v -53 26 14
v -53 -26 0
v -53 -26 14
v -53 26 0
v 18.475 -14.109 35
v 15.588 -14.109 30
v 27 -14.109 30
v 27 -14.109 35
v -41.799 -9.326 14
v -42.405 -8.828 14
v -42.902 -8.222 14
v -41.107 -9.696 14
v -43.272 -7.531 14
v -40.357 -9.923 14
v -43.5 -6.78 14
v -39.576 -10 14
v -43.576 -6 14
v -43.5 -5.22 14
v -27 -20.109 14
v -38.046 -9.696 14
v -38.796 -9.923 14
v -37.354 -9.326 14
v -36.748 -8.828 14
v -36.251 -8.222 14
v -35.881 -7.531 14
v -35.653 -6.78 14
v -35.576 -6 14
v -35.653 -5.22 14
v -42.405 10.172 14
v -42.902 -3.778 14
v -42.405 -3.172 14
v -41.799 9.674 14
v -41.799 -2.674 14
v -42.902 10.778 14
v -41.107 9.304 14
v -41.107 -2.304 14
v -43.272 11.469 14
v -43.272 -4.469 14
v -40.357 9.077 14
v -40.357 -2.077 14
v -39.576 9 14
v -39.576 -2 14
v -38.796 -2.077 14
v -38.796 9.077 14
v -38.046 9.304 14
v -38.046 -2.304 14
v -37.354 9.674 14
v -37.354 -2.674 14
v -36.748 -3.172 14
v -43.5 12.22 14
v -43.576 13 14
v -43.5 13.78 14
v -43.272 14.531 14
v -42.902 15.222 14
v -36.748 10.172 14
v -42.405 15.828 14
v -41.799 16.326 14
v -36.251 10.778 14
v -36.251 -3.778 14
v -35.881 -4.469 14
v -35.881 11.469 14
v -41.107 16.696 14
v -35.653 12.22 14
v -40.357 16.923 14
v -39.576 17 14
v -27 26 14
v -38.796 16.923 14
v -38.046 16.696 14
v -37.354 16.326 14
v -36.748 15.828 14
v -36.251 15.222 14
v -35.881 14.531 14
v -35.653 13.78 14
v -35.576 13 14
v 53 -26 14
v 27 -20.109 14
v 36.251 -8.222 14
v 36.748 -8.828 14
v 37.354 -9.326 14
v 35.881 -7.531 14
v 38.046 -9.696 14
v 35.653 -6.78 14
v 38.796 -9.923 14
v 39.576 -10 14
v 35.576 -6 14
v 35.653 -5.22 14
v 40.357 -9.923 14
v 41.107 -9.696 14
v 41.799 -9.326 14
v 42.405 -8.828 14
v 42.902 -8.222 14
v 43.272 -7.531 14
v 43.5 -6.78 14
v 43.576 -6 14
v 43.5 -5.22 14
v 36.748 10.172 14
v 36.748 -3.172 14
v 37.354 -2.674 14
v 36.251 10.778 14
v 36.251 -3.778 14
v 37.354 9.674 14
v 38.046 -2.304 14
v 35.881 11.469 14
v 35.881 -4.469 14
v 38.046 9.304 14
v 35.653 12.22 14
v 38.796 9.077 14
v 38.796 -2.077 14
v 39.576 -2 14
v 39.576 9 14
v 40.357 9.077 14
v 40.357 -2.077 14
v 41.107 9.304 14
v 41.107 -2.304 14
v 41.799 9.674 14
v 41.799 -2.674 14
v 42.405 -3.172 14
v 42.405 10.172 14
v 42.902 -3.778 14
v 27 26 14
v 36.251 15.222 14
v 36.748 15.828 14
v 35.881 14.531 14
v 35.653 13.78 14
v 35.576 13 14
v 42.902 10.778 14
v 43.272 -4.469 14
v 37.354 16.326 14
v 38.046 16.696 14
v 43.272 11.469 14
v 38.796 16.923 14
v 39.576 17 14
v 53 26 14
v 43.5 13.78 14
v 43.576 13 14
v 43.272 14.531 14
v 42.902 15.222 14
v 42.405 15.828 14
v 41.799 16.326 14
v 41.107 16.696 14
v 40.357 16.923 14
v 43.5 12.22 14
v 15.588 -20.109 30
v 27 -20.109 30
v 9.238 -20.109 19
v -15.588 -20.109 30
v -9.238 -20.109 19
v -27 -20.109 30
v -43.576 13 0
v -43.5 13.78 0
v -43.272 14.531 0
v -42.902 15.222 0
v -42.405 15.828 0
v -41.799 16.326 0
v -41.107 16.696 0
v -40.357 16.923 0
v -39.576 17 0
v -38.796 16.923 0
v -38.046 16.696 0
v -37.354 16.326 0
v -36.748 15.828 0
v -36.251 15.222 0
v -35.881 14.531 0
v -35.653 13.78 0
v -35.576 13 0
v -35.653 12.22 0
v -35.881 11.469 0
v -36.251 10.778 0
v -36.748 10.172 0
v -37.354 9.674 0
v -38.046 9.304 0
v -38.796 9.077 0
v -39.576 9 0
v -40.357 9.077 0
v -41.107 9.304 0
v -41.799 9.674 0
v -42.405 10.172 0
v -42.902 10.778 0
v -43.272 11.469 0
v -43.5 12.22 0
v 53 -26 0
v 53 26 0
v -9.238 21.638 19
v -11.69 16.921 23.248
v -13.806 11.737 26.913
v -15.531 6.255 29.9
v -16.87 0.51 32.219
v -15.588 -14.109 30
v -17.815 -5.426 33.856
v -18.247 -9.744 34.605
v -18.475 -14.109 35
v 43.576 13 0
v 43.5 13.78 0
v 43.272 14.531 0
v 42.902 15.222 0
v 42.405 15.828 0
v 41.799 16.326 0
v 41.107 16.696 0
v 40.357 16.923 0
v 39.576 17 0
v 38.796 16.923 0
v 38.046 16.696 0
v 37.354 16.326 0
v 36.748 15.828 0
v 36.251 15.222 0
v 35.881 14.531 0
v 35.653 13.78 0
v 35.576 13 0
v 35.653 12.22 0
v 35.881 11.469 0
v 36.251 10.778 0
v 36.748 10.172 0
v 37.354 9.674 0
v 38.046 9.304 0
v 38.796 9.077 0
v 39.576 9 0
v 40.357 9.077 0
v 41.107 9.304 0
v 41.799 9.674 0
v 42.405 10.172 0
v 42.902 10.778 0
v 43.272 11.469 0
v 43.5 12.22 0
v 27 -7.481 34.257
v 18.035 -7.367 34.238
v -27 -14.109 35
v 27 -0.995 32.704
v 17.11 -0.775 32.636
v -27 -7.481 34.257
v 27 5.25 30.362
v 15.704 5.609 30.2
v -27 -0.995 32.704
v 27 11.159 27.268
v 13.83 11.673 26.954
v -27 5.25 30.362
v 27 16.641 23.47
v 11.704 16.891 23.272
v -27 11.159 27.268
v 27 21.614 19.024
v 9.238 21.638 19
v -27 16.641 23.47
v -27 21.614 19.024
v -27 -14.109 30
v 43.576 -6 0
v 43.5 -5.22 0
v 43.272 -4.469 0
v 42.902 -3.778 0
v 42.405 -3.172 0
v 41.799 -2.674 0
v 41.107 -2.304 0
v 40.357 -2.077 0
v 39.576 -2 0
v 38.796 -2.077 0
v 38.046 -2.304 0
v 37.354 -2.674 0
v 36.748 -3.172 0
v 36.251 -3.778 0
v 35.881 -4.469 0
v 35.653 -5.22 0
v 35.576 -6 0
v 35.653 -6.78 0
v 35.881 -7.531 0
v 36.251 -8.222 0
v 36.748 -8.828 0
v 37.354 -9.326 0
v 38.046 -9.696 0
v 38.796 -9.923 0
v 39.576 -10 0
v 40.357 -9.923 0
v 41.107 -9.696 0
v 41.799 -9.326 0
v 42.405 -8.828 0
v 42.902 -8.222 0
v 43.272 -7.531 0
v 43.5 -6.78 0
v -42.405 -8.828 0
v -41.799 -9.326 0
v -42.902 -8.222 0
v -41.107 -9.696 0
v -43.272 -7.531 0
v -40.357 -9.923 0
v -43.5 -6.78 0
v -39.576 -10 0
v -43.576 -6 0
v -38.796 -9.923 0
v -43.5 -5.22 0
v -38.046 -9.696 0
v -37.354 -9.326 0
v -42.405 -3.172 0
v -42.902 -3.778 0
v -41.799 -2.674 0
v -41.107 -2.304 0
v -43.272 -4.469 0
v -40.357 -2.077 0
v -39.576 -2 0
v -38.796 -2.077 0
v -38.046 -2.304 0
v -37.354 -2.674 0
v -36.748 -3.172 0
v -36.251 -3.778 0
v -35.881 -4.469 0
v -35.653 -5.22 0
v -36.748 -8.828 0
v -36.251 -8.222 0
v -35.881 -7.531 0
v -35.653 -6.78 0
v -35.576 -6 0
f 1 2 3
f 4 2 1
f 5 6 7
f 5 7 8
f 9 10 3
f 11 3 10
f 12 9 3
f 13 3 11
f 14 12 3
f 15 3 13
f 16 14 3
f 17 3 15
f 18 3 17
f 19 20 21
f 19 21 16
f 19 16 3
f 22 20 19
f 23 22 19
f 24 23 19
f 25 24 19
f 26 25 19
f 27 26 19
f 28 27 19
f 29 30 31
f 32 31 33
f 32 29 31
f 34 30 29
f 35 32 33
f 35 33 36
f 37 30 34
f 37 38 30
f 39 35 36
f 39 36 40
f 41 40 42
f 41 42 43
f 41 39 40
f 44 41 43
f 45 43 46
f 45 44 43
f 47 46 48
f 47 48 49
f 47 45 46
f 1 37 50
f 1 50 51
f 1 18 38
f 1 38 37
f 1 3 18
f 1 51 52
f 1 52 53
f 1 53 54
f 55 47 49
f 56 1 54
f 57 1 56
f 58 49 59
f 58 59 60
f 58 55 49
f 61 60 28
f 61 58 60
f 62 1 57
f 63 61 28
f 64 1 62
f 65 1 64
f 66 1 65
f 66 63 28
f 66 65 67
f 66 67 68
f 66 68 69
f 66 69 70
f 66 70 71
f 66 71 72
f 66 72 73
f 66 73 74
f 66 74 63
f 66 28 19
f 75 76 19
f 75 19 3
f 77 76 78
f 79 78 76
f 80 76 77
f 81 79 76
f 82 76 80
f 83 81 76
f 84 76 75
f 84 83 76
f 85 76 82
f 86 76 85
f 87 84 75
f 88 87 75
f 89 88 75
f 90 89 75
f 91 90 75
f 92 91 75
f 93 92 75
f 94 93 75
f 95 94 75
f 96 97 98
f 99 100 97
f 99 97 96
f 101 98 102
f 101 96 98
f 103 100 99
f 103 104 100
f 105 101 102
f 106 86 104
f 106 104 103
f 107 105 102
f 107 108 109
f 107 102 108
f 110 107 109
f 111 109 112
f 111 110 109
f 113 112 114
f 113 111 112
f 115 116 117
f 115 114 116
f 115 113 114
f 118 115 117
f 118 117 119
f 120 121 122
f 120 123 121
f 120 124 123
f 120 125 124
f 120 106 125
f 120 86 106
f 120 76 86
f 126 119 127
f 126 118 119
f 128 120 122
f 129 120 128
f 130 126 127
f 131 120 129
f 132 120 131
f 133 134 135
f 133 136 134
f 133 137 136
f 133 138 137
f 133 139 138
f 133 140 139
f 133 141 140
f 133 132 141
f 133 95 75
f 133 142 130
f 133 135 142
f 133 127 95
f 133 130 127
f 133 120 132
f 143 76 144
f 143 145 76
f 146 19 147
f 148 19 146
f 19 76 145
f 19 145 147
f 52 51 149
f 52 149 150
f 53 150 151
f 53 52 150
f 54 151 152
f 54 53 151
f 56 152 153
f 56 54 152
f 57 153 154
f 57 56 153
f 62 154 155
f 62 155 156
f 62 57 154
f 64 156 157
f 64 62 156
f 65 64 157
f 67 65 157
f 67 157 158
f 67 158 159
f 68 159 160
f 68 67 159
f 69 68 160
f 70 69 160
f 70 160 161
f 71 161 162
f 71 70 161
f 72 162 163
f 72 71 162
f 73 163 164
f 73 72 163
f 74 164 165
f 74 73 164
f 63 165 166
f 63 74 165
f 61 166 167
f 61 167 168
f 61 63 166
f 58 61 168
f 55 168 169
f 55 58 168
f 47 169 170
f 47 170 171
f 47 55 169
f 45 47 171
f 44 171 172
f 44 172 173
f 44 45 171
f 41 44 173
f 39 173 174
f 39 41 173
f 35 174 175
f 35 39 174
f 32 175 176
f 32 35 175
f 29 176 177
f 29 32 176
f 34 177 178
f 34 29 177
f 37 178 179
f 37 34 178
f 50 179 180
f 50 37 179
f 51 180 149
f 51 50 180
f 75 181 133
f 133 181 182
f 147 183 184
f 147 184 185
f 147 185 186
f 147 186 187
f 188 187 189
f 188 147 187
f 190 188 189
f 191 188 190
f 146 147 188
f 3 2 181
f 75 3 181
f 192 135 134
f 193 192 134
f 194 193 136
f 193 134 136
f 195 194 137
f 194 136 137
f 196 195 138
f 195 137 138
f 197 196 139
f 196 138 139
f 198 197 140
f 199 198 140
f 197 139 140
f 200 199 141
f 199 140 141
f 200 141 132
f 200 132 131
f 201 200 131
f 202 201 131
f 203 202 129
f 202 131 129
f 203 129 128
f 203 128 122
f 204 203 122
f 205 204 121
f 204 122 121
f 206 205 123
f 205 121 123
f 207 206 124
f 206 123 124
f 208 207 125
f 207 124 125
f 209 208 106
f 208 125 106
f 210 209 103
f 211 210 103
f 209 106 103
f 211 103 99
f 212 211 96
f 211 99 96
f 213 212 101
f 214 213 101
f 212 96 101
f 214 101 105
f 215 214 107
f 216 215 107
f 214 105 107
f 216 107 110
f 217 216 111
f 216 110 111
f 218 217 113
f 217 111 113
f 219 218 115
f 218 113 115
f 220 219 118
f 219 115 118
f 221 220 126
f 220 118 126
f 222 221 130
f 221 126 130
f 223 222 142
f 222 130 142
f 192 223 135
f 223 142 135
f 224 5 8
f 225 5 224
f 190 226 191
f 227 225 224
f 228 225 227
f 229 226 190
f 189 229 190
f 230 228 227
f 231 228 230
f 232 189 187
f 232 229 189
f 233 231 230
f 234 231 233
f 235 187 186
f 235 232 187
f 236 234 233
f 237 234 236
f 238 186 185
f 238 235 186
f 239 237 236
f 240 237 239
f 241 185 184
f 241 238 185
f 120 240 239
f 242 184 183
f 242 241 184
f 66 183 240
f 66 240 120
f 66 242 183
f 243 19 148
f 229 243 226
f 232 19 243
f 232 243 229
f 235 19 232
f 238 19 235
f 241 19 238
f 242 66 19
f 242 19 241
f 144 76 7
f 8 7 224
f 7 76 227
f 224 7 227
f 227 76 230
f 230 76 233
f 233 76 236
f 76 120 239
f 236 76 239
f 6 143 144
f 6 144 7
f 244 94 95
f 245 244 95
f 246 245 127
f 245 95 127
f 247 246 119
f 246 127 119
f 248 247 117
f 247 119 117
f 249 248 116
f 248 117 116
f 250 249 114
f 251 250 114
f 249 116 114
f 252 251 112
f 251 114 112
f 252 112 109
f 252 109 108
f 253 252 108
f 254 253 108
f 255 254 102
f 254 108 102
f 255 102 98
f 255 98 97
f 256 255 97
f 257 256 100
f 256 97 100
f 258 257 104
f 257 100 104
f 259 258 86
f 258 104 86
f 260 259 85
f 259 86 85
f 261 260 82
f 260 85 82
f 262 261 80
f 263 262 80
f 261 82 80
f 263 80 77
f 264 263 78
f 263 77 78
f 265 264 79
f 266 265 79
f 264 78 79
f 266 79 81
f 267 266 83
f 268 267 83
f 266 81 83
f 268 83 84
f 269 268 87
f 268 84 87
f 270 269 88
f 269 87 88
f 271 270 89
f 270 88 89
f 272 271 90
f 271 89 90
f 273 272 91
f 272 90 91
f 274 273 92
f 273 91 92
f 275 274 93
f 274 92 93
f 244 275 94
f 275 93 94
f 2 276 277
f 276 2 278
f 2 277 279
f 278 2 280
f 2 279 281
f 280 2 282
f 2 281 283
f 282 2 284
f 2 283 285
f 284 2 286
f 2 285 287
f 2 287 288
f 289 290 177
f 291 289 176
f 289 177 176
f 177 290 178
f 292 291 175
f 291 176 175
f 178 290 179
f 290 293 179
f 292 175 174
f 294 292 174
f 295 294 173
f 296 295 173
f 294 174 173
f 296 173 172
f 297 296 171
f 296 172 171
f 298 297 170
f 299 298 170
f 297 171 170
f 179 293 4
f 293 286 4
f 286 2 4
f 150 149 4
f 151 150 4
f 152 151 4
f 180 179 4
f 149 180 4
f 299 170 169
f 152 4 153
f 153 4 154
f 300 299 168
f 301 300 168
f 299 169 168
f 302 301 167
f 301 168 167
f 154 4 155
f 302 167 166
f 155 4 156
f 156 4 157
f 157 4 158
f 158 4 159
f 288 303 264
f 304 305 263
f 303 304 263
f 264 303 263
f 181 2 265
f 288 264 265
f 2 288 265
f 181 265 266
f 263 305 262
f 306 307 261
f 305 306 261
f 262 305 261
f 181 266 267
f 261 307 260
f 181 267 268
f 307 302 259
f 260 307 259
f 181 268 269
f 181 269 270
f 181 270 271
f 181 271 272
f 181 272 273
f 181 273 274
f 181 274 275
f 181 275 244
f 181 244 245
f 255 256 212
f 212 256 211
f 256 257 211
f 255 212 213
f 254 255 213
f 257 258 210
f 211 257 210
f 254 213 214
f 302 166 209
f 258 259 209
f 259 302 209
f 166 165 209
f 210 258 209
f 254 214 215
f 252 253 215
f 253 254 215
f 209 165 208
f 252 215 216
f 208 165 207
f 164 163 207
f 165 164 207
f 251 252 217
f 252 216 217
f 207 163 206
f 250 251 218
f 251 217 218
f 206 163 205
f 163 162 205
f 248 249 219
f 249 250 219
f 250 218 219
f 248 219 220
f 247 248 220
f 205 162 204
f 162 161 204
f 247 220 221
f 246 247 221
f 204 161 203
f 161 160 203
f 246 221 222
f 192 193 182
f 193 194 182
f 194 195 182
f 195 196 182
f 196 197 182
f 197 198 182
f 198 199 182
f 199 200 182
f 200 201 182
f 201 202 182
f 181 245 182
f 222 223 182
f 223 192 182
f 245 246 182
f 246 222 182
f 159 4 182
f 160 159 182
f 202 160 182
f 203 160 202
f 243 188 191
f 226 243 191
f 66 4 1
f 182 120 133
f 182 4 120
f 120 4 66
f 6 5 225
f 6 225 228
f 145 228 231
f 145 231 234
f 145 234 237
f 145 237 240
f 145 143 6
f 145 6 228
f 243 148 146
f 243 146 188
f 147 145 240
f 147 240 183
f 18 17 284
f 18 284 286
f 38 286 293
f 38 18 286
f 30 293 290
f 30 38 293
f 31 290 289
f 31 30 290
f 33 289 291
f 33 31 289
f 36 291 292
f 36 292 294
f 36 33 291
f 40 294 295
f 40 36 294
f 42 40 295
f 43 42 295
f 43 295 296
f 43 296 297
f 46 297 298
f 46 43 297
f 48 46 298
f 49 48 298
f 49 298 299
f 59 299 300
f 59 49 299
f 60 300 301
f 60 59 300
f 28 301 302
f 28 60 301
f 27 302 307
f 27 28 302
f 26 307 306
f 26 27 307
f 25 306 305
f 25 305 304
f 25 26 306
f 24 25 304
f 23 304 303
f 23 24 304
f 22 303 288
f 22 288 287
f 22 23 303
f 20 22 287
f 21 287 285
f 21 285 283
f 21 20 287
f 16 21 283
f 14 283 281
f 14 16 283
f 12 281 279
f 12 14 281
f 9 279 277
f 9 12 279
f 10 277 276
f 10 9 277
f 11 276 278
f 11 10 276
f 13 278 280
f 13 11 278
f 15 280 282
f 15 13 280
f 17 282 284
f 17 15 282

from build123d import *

# Parameters (mm, degrees)
SKETCH1_W           = 106
SKETCH1_H           = 52
BOSS_EXTRUDE1_DEPTH = 14
SKETCH2_R           = 4
CUT_EXTRUDE1_DEPTH  = 14
BOSS_EXTRUDE2_DEPTH = 27
CUT_EXTRUDE2_DEPTH  = 79.485834959


with BuildPart() as part:
    # Sketch1 → Boss-Extrude1 (new body)
    with BuildSketch(Plane.XY):
        Rectangle(SKETCH1_W, SKETCH1_H)
    extrude(amount=BOSS_EXTRUDE1_DEPTH)

    # Sketch2 → Cut-Extrude1 (cut)
    with BuildSketch(Plane.XY.offset(14)):
        with Locations((39.576420428, 13)):
            Circle(SKETCH2_R)
        with Locations((39.576420428, -6)):
            Circle(SKETCH2_R)
    cut_extrude1 = extrude(amount=-CUT_EXTRUDE1_DEPTH, mode=Mode.SUBTRACT)

    # Mirror1: Cut-Extrude1 across plane
    add(cut_extrude1.mirror(Plane.ZY), mode=Mode.SUBTRACT)

    # Sketch4 → Boss-Extrude2 (add, symmetric)
    with BuildSketch(Plane.ZY):
        with BuildLine():
            Line((14, 26), (14, -20.108852612))
            Line((14, -20.108852612), (30, -20.108852612))
            Line((30, -20.108852612), (30, -14.108852612))
            Line((30, -14.108852612), (35, -14.108852612))
            ThreePointArc((35, -14.108852612), (28.906357886, 8.252633347), (14, 26))
        make_face()
    extrude(amount=BOSS_EXTRUDE2_DEPTH, both=True)

    # Sketch6 → Cut-Extrude2 (cut, through all)
    with BuildSketch(Plane.XZ.offset(20.108852612)):
        Polygon((-9.237604307, 19), (-18.475208614, 35), (18.475208614, 35), (9.237604307, 19), align=None)
    extrude(amount=-CUT_EXTRUDE2_DEPTH, mode=Mode.SUBTRACT)


solid = part.part
